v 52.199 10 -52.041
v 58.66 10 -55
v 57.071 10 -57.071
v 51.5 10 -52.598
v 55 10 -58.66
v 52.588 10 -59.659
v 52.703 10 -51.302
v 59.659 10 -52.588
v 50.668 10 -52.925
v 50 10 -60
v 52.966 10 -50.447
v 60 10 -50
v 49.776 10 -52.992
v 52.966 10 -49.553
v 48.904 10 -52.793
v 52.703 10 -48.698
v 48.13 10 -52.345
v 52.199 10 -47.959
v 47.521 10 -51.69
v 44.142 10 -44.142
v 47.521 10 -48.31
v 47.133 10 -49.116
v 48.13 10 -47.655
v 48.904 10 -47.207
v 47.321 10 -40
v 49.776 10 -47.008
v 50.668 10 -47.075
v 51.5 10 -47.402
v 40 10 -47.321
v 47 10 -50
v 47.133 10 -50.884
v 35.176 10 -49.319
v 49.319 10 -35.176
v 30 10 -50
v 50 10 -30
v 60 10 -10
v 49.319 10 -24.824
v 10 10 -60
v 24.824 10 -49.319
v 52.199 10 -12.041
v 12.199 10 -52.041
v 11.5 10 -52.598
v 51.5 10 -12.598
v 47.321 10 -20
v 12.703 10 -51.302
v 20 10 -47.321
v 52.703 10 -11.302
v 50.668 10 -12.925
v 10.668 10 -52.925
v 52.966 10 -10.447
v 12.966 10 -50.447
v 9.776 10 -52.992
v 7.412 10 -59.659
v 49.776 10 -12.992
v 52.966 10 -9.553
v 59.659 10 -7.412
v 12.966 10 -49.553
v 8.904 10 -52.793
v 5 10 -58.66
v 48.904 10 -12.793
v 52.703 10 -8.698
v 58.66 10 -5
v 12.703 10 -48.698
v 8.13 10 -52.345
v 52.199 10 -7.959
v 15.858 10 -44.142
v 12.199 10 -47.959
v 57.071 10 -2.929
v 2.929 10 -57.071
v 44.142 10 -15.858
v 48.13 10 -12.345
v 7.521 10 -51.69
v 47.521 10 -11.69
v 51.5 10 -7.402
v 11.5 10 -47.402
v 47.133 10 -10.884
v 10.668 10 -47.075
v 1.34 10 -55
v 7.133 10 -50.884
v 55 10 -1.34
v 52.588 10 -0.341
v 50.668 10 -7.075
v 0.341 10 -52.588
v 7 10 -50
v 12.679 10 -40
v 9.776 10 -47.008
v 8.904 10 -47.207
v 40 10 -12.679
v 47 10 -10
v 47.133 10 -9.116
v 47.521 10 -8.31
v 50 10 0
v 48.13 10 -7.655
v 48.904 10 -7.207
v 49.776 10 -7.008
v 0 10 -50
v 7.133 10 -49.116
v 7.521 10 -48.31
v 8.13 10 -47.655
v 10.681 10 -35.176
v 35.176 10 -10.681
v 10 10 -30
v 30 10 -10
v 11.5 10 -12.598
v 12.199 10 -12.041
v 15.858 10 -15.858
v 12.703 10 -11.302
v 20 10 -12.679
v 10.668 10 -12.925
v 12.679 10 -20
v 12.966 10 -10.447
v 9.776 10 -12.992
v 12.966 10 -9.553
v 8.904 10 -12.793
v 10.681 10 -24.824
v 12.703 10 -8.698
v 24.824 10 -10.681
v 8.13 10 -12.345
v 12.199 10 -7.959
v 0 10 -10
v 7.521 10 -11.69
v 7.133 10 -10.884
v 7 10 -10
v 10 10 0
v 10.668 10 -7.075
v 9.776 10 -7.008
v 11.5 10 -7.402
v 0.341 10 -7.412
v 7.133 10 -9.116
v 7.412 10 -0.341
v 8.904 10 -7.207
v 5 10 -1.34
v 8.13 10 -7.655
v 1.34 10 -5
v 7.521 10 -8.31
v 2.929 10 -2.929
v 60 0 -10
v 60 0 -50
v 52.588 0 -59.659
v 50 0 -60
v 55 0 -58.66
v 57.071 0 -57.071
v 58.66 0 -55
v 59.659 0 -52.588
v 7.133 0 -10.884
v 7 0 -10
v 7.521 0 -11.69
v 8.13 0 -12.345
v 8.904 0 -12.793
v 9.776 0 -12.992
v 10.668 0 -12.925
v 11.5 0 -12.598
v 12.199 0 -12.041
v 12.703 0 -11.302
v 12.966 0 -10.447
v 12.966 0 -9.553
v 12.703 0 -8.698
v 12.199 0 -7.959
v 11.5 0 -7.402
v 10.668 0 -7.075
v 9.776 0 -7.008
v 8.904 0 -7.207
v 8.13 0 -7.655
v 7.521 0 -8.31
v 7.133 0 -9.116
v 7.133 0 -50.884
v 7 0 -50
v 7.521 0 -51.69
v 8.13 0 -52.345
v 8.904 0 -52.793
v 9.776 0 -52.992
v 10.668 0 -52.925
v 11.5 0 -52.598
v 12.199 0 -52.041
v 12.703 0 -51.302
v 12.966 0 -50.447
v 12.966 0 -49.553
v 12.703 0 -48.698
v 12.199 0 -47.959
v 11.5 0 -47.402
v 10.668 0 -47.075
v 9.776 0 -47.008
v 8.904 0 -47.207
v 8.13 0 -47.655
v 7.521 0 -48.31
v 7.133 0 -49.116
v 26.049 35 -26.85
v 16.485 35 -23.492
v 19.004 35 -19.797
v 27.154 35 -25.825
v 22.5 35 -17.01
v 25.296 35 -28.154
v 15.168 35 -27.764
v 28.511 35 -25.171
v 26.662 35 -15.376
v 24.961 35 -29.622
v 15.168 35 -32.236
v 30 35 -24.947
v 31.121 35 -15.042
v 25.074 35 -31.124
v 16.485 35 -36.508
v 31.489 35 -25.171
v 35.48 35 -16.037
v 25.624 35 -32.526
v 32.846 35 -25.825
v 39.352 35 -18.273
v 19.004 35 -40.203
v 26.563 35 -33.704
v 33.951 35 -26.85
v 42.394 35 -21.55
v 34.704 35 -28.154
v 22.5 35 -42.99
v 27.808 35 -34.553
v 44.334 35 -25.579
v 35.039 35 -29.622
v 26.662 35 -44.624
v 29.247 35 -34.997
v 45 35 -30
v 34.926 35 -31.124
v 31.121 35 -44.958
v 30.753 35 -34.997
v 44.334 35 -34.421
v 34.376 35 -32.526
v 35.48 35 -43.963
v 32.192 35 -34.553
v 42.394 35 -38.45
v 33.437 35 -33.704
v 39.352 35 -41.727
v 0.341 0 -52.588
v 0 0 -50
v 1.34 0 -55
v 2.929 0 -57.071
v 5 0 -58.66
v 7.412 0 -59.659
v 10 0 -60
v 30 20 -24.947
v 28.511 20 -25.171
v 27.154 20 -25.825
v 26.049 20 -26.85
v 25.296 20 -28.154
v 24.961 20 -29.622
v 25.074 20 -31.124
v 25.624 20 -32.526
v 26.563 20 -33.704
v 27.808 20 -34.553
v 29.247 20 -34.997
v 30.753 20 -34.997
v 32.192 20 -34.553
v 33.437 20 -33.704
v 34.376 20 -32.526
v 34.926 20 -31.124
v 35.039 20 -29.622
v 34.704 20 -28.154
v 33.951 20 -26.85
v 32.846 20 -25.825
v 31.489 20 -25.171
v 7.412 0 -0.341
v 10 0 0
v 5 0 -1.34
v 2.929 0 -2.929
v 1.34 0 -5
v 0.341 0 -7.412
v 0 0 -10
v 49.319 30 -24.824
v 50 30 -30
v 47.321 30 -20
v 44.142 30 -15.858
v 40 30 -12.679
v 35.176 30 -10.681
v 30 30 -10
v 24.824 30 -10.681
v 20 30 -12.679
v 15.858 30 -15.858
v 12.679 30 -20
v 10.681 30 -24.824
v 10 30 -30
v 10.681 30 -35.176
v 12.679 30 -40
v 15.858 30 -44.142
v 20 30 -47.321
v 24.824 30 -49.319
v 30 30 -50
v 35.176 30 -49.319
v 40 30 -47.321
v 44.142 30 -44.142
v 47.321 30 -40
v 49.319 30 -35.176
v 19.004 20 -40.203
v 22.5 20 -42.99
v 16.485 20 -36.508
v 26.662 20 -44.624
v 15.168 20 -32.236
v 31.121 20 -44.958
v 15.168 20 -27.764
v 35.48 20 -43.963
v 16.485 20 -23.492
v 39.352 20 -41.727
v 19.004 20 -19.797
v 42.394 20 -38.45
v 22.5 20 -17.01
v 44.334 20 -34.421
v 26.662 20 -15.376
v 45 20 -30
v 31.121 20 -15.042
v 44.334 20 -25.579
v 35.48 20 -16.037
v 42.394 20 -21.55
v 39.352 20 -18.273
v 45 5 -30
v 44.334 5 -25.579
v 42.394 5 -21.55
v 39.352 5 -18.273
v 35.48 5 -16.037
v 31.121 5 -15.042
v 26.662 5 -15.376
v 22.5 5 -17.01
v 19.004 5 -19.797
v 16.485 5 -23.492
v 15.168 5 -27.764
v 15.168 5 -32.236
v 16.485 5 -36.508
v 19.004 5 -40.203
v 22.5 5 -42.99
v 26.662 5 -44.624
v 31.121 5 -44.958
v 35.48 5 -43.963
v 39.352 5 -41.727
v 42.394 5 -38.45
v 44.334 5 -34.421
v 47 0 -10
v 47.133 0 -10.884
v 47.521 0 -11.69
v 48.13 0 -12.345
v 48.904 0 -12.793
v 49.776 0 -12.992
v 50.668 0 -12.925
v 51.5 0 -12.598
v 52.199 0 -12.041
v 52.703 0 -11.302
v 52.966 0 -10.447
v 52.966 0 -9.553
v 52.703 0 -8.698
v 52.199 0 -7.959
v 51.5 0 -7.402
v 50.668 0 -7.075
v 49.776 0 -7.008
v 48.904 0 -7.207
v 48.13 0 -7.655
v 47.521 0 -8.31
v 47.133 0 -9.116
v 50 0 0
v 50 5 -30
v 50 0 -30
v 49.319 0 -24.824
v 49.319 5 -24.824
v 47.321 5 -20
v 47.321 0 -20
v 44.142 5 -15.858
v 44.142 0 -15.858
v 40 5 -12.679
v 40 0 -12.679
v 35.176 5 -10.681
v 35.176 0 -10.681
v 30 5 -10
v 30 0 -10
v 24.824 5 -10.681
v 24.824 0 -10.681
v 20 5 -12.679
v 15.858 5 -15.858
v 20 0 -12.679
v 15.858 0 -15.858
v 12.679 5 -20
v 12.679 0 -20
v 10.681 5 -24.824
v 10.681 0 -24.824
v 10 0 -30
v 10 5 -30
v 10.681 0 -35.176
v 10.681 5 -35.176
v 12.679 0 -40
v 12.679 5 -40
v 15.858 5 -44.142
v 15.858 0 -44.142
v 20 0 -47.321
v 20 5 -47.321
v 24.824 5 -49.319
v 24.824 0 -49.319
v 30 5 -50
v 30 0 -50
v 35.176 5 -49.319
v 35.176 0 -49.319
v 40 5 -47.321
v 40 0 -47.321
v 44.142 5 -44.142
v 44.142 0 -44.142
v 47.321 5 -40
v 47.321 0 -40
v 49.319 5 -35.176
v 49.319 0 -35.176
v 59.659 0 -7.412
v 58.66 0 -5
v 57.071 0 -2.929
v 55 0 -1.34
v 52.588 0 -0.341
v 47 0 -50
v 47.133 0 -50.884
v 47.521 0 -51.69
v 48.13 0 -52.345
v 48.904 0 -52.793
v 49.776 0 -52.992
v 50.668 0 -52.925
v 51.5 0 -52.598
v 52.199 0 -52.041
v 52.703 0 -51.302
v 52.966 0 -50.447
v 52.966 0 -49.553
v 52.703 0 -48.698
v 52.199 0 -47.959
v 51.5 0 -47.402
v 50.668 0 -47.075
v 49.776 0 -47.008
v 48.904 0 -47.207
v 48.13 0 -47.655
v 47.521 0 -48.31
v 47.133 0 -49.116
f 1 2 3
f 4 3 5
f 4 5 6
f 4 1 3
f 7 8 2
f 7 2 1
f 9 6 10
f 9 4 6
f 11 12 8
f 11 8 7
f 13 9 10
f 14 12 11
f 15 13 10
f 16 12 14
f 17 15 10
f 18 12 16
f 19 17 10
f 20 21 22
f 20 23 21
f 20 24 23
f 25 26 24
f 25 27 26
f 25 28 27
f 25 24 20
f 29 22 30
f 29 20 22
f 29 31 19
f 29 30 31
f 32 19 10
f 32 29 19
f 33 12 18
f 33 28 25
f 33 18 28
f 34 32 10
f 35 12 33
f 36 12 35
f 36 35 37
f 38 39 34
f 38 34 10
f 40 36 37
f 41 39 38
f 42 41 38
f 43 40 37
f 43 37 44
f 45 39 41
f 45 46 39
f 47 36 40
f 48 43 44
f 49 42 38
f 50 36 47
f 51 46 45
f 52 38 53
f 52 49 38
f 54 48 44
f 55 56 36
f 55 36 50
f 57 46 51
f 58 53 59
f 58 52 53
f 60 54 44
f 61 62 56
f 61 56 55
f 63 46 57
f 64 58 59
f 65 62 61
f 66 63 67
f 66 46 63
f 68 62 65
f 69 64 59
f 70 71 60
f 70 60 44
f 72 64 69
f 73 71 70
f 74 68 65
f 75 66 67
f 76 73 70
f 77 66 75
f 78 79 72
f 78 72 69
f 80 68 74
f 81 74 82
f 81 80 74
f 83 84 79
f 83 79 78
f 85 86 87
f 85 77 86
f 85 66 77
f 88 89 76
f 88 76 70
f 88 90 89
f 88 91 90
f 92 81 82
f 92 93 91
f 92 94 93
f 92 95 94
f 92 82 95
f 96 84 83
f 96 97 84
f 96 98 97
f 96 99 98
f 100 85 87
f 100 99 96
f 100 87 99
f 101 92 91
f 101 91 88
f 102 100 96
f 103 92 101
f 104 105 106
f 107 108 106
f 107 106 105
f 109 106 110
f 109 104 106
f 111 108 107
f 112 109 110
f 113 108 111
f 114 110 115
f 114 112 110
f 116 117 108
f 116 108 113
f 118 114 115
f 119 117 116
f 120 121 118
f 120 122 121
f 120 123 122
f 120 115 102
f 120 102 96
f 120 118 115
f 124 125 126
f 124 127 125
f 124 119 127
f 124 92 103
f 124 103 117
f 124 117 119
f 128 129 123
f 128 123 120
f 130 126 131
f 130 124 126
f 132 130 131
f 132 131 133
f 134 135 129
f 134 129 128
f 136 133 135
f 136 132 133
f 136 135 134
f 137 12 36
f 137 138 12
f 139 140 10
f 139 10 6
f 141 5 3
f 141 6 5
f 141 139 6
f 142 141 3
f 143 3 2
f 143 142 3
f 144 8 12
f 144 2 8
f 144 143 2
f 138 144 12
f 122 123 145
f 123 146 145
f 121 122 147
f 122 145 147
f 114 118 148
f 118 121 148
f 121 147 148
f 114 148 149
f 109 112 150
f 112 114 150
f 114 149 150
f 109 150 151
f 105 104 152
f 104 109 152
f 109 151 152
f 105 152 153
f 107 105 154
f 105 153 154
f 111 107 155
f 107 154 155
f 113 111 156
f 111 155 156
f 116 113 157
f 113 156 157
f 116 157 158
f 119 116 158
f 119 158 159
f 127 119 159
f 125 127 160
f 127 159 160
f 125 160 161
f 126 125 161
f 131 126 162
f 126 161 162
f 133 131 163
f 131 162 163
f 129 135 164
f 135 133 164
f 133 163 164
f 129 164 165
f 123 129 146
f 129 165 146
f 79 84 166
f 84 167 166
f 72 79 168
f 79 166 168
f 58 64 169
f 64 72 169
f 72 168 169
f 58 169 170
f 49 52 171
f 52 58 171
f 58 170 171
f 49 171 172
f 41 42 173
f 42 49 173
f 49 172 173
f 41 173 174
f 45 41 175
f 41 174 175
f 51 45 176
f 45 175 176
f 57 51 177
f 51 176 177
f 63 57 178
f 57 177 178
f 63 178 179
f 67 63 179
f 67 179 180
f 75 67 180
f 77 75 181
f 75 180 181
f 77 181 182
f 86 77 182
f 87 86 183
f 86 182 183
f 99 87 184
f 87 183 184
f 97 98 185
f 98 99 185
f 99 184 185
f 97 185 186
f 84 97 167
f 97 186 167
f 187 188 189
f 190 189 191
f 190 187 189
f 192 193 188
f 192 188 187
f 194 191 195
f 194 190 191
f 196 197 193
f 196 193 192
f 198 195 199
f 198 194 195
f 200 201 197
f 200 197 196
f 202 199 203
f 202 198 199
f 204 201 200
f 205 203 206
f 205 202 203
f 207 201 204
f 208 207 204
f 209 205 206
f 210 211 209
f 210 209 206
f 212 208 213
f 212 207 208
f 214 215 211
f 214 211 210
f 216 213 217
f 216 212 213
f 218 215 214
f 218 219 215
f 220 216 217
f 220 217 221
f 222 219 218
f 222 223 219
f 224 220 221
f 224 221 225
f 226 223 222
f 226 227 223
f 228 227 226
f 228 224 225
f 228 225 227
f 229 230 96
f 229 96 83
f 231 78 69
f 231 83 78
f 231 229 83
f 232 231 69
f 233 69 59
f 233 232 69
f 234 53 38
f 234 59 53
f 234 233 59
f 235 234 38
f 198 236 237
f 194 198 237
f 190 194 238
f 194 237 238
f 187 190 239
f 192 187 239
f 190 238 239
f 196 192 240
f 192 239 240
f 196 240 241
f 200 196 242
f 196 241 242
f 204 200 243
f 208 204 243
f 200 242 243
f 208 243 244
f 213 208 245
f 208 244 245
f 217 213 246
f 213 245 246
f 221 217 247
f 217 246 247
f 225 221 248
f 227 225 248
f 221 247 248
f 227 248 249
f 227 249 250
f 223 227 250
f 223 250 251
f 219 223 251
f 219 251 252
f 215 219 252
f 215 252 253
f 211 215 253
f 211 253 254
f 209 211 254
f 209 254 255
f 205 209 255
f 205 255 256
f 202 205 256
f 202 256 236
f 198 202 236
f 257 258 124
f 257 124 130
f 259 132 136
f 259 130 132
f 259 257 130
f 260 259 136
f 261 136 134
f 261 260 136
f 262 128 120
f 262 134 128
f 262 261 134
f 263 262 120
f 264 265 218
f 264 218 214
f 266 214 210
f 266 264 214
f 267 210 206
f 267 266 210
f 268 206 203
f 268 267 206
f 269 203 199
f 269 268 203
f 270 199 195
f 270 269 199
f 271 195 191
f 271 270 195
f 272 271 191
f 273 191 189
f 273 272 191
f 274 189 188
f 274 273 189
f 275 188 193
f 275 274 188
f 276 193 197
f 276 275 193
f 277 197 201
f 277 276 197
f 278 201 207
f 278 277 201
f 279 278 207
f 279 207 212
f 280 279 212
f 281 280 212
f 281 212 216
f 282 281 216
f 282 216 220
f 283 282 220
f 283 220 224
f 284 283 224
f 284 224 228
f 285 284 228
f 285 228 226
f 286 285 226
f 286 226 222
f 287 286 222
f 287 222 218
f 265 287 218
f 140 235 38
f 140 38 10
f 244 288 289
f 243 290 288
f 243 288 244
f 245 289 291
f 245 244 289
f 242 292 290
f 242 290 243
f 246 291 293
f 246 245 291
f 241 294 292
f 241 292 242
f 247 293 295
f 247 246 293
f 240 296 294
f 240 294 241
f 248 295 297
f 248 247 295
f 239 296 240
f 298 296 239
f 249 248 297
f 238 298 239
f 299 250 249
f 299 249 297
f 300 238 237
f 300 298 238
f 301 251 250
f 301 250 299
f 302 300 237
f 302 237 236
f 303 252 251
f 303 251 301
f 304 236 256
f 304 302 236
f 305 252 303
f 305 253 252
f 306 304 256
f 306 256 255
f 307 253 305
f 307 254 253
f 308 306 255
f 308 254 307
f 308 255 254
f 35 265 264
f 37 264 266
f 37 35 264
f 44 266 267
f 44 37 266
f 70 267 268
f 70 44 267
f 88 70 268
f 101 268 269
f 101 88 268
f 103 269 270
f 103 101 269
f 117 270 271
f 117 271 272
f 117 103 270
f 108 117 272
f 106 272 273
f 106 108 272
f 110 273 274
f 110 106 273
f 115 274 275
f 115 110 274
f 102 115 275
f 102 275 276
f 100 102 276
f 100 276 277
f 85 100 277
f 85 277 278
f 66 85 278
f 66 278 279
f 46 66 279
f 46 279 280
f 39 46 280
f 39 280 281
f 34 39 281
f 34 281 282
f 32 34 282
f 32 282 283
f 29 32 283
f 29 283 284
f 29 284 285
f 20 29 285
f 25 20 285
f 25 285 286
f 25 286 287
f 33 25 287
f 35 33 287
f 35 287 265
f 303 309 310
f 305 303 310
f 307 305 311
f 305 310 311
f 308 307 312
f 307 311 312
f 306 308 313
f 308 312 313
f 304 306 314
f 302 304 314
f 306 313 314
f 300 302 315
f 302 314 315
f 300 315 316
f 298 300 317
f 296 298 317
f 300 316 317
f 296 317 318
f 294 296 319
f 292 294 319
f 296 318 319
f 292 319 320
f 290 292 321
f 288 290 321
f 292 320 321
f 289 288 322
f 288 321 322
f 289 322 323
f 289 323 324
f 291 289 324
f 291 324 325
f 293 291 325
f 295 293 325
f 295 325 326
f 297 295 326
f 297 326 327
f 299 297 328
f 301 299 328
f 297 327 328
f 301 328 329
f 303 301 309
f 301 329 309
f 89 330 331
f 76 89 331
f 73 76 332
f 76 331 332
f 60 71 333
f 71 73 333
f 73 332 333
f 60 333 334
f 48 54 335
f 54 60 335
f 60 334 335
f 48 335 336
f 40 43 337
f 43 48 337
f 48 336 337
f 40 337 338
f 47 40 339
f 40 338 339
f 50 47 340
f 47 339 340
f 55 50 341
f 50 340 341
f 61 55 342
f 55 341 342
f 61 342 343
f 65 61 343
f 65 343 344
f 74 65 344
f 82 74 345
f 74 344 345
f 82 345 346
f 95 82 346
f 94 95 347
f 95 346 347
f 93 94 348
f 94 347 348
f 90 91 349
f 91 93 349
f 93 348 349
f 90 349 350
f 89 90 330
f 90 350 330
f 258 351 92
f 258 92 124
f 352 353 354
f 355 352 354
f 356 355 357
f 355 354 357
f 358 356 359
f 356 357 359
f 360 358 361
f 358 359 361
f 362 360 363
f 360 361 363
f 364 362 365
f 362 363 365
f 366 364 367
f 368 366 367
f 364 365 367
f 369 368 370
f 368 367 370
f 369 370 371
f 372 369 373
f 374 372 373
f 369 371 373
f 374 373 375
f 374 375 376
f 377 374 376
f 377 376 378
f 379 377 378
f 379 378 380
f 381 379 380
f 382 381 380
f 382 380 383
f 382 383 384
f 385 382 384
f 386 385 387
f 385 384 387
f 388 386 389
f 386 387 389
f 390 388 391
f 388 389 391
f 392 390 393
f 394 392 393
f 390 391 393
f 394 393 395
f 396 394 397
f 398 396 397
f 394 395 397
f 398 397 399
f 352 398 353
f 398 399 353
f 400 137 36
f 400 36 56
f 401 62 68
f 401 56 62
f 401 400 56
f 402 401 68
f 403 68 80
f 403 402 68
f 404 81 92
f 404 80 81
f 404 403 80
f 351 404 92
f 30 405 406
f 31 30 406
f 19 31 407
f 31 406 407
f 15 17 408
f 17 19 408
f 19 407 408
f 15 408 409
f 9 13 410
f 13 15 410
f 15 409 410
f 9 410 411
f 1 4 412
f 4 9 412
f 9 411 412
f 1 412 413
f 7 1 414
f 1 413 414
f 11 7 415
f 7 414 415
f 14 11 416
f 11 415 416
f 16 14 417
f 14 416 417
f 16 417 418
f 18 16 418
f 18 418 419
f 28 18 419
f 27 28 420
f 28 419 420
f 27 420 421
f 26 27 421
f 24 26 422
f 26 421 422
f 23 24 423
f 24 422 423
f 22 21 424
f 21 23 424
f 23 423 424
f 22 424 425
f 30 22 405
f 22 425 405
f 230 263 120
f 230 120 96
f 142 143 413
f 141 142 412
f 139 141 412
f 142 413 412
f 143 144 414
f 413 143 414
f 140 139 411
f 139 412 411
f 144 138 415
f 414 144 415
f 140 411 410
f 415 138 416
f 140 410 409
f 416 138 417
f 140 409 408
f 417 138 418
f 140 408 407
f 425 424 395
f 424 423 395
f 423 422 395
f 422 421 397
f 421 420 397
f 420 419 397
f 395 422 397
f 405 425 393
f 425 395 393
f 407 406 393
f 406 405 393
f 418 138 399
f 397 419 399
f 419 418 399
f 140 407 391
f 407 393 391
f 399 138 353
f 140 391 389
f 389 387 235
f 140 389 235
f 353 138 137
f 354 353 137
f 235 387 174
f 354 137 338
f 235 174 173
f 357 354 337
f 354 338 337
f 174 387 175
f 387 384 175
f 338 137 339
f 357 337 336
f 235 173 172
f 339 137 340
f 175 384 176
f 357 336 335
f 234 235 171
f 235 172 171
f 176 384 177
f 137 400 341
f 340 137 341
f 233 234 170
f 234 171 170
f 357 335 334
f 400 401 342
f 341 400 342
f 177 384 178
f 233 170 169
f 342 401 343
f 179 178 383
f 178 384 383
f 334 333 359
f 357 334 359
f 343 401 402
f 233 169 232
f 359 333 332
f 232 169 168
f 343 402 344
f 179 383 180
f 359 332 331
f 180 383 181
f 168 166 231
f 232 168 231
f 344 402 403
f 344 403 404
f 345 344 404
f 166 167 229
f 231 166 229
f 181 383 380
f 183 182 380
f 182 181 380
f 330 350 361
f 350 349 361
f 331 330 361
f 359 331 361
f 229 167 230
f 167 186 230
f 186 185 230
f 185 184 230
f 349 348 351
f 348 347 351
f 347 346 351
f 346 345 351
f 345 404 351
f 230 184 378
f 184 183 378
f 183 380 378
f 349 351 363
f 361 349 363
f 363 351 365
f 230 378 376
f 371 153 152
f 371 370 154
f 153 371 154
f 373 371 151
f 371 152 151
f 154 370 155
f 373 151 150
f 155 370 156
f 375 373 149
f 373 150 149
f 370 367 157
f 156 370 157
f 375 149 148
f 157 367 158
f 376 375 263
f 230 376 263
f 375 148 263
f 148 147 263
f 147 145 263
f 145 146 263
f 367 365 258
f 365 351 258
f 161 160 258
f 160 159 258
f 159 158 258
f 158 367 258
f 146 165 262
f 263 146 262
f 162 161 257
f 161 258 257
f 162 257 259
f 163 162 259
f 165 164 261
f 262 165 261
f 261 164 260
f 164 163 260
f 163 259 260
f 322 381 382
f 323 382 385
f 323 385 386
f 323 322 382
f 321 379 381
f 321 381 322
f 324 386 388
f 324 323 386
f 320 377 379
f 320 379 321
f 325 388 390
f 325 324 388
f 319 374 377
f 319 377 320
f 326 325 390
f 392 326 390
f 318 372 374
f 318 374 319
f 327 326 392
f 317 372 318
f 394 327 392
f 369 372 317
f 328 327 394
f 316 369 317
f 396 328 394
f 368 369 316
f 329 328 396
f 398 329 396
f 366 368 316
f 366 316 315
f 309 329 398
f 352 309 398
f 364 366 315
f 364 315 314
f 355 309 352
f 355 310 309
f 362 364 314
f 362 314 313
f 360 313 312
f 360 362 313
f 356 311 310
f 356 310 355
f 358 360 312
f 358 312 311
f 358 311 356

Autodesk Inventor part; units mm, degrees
ref_plane "YZ Plane" through (0, 0, 0) normal (1, 0, 0) x (0, 1, 0)
ref_plane "XZ Plane" through (0, 0, 0) normal (0, 1, 0) x (-1, 0, 0)
ref_plane "XY Plane" through (0, 0, 0) normal (0, 0, 1) x (1, 0, 0)
sketch "Sketch1" plane through (0, 0, 0) normal (0, 1, 0) x (-1, 0, 0)
  line L0 (-10, -60) -> (-50, -60)
  line L1 (-60, -50) -> (-60, -10)
  line L2 (-50, 0) -> (-10, 0)
  line L3 (0, -10) -> (0, -50)
  arc A0 (-60, -50) -> (-50, -60) centre (-50, -50) ccw
  arc A1 (-10, -60) -> (0, -50) centre (-10, -50) ccw
  arc A2 (0, -10) -> (-10, 0) centre (-10, -10) ccw
  arc A3 (-50, 0) -> (-60, -10) centre (-50, -10) ccw
  circle A4 centre (-10, -50) radius 3
  circle A5 centre (-50, -50) radius 3
  circle A6 centre (-10, -10) radius 3
  circle A7 centre (-50, -10) radius 3
  point P0 (0, 0)
  point P1 (0, 0)
  point P2 (-30, 0)
  dimension "d0" = 60
  dimension "d1" = 60
  dimension "d2" = 10
  dimension "d3" = 6
extrude "Extrusion1" add sketch "Sketch1" along normal blind 10
sketch "Sketch2" plane through (0, 10, 0) normal (0, 1, 0) x (1, 0, 0)
  line L0 (0, 50) -> (0, 10) projected
  line L1 (0, 30) -> (60, 30)
  line L2 (60, 10) -> (60, 50) projected
  line L3 (30, 60) -> (30, 0)
  line L4 (10, 0) -> (50, 0) projected
  line L5 (50, 60) -> (10, 60) projected
  circle A0 centre (30, 30) radius 20
  point P0 (0, 0)
  point P1 (30, 0)
  dimension "d6" = 40
extrude "Extrusion2" add sketch "Sketch2" along normal blind 25
chamfer "Chamfer1" distance 5 angle 45 1 edges at (10, 35, -30)
sketch "Sketch3" plane through (0, 0, 0) normal (0, -1, 0) x (1, 0, 0)
  circle A0 centre (30, -30) radius 15 projected
  point P0 (0, 0)
extrude "Extrusion3" cut sketch "Sketch3" against normal blind 20
sketch "Sketch4" plane through (0, 0, 0) normal (0, -1, 0) x (1, 0, 0)
  circle A0 centre (30, -30) radius 20 projected
  point P0 (0, 0)
extrude "Extrusion4" cut sketch "Sketch4" against normal blind 5
sketch "Sketch5" plane through (30, 35, -30) normal (0, 1, 0) x (1, 0, 0)
  circle A0 centre (0, 0) radius 6
  circle A1 centre (0, 0) radius 15 projected
  point P0 (-30, -30)
  dimension "d16" = 12
hole "Hole1" at (30, 35, -30) direction (0, -1, 0) diameter 10.106 end through all thread size "M12x1.75" class "6H" standard "ISO Metric profile"
properties part number "Valve Bonnet"
